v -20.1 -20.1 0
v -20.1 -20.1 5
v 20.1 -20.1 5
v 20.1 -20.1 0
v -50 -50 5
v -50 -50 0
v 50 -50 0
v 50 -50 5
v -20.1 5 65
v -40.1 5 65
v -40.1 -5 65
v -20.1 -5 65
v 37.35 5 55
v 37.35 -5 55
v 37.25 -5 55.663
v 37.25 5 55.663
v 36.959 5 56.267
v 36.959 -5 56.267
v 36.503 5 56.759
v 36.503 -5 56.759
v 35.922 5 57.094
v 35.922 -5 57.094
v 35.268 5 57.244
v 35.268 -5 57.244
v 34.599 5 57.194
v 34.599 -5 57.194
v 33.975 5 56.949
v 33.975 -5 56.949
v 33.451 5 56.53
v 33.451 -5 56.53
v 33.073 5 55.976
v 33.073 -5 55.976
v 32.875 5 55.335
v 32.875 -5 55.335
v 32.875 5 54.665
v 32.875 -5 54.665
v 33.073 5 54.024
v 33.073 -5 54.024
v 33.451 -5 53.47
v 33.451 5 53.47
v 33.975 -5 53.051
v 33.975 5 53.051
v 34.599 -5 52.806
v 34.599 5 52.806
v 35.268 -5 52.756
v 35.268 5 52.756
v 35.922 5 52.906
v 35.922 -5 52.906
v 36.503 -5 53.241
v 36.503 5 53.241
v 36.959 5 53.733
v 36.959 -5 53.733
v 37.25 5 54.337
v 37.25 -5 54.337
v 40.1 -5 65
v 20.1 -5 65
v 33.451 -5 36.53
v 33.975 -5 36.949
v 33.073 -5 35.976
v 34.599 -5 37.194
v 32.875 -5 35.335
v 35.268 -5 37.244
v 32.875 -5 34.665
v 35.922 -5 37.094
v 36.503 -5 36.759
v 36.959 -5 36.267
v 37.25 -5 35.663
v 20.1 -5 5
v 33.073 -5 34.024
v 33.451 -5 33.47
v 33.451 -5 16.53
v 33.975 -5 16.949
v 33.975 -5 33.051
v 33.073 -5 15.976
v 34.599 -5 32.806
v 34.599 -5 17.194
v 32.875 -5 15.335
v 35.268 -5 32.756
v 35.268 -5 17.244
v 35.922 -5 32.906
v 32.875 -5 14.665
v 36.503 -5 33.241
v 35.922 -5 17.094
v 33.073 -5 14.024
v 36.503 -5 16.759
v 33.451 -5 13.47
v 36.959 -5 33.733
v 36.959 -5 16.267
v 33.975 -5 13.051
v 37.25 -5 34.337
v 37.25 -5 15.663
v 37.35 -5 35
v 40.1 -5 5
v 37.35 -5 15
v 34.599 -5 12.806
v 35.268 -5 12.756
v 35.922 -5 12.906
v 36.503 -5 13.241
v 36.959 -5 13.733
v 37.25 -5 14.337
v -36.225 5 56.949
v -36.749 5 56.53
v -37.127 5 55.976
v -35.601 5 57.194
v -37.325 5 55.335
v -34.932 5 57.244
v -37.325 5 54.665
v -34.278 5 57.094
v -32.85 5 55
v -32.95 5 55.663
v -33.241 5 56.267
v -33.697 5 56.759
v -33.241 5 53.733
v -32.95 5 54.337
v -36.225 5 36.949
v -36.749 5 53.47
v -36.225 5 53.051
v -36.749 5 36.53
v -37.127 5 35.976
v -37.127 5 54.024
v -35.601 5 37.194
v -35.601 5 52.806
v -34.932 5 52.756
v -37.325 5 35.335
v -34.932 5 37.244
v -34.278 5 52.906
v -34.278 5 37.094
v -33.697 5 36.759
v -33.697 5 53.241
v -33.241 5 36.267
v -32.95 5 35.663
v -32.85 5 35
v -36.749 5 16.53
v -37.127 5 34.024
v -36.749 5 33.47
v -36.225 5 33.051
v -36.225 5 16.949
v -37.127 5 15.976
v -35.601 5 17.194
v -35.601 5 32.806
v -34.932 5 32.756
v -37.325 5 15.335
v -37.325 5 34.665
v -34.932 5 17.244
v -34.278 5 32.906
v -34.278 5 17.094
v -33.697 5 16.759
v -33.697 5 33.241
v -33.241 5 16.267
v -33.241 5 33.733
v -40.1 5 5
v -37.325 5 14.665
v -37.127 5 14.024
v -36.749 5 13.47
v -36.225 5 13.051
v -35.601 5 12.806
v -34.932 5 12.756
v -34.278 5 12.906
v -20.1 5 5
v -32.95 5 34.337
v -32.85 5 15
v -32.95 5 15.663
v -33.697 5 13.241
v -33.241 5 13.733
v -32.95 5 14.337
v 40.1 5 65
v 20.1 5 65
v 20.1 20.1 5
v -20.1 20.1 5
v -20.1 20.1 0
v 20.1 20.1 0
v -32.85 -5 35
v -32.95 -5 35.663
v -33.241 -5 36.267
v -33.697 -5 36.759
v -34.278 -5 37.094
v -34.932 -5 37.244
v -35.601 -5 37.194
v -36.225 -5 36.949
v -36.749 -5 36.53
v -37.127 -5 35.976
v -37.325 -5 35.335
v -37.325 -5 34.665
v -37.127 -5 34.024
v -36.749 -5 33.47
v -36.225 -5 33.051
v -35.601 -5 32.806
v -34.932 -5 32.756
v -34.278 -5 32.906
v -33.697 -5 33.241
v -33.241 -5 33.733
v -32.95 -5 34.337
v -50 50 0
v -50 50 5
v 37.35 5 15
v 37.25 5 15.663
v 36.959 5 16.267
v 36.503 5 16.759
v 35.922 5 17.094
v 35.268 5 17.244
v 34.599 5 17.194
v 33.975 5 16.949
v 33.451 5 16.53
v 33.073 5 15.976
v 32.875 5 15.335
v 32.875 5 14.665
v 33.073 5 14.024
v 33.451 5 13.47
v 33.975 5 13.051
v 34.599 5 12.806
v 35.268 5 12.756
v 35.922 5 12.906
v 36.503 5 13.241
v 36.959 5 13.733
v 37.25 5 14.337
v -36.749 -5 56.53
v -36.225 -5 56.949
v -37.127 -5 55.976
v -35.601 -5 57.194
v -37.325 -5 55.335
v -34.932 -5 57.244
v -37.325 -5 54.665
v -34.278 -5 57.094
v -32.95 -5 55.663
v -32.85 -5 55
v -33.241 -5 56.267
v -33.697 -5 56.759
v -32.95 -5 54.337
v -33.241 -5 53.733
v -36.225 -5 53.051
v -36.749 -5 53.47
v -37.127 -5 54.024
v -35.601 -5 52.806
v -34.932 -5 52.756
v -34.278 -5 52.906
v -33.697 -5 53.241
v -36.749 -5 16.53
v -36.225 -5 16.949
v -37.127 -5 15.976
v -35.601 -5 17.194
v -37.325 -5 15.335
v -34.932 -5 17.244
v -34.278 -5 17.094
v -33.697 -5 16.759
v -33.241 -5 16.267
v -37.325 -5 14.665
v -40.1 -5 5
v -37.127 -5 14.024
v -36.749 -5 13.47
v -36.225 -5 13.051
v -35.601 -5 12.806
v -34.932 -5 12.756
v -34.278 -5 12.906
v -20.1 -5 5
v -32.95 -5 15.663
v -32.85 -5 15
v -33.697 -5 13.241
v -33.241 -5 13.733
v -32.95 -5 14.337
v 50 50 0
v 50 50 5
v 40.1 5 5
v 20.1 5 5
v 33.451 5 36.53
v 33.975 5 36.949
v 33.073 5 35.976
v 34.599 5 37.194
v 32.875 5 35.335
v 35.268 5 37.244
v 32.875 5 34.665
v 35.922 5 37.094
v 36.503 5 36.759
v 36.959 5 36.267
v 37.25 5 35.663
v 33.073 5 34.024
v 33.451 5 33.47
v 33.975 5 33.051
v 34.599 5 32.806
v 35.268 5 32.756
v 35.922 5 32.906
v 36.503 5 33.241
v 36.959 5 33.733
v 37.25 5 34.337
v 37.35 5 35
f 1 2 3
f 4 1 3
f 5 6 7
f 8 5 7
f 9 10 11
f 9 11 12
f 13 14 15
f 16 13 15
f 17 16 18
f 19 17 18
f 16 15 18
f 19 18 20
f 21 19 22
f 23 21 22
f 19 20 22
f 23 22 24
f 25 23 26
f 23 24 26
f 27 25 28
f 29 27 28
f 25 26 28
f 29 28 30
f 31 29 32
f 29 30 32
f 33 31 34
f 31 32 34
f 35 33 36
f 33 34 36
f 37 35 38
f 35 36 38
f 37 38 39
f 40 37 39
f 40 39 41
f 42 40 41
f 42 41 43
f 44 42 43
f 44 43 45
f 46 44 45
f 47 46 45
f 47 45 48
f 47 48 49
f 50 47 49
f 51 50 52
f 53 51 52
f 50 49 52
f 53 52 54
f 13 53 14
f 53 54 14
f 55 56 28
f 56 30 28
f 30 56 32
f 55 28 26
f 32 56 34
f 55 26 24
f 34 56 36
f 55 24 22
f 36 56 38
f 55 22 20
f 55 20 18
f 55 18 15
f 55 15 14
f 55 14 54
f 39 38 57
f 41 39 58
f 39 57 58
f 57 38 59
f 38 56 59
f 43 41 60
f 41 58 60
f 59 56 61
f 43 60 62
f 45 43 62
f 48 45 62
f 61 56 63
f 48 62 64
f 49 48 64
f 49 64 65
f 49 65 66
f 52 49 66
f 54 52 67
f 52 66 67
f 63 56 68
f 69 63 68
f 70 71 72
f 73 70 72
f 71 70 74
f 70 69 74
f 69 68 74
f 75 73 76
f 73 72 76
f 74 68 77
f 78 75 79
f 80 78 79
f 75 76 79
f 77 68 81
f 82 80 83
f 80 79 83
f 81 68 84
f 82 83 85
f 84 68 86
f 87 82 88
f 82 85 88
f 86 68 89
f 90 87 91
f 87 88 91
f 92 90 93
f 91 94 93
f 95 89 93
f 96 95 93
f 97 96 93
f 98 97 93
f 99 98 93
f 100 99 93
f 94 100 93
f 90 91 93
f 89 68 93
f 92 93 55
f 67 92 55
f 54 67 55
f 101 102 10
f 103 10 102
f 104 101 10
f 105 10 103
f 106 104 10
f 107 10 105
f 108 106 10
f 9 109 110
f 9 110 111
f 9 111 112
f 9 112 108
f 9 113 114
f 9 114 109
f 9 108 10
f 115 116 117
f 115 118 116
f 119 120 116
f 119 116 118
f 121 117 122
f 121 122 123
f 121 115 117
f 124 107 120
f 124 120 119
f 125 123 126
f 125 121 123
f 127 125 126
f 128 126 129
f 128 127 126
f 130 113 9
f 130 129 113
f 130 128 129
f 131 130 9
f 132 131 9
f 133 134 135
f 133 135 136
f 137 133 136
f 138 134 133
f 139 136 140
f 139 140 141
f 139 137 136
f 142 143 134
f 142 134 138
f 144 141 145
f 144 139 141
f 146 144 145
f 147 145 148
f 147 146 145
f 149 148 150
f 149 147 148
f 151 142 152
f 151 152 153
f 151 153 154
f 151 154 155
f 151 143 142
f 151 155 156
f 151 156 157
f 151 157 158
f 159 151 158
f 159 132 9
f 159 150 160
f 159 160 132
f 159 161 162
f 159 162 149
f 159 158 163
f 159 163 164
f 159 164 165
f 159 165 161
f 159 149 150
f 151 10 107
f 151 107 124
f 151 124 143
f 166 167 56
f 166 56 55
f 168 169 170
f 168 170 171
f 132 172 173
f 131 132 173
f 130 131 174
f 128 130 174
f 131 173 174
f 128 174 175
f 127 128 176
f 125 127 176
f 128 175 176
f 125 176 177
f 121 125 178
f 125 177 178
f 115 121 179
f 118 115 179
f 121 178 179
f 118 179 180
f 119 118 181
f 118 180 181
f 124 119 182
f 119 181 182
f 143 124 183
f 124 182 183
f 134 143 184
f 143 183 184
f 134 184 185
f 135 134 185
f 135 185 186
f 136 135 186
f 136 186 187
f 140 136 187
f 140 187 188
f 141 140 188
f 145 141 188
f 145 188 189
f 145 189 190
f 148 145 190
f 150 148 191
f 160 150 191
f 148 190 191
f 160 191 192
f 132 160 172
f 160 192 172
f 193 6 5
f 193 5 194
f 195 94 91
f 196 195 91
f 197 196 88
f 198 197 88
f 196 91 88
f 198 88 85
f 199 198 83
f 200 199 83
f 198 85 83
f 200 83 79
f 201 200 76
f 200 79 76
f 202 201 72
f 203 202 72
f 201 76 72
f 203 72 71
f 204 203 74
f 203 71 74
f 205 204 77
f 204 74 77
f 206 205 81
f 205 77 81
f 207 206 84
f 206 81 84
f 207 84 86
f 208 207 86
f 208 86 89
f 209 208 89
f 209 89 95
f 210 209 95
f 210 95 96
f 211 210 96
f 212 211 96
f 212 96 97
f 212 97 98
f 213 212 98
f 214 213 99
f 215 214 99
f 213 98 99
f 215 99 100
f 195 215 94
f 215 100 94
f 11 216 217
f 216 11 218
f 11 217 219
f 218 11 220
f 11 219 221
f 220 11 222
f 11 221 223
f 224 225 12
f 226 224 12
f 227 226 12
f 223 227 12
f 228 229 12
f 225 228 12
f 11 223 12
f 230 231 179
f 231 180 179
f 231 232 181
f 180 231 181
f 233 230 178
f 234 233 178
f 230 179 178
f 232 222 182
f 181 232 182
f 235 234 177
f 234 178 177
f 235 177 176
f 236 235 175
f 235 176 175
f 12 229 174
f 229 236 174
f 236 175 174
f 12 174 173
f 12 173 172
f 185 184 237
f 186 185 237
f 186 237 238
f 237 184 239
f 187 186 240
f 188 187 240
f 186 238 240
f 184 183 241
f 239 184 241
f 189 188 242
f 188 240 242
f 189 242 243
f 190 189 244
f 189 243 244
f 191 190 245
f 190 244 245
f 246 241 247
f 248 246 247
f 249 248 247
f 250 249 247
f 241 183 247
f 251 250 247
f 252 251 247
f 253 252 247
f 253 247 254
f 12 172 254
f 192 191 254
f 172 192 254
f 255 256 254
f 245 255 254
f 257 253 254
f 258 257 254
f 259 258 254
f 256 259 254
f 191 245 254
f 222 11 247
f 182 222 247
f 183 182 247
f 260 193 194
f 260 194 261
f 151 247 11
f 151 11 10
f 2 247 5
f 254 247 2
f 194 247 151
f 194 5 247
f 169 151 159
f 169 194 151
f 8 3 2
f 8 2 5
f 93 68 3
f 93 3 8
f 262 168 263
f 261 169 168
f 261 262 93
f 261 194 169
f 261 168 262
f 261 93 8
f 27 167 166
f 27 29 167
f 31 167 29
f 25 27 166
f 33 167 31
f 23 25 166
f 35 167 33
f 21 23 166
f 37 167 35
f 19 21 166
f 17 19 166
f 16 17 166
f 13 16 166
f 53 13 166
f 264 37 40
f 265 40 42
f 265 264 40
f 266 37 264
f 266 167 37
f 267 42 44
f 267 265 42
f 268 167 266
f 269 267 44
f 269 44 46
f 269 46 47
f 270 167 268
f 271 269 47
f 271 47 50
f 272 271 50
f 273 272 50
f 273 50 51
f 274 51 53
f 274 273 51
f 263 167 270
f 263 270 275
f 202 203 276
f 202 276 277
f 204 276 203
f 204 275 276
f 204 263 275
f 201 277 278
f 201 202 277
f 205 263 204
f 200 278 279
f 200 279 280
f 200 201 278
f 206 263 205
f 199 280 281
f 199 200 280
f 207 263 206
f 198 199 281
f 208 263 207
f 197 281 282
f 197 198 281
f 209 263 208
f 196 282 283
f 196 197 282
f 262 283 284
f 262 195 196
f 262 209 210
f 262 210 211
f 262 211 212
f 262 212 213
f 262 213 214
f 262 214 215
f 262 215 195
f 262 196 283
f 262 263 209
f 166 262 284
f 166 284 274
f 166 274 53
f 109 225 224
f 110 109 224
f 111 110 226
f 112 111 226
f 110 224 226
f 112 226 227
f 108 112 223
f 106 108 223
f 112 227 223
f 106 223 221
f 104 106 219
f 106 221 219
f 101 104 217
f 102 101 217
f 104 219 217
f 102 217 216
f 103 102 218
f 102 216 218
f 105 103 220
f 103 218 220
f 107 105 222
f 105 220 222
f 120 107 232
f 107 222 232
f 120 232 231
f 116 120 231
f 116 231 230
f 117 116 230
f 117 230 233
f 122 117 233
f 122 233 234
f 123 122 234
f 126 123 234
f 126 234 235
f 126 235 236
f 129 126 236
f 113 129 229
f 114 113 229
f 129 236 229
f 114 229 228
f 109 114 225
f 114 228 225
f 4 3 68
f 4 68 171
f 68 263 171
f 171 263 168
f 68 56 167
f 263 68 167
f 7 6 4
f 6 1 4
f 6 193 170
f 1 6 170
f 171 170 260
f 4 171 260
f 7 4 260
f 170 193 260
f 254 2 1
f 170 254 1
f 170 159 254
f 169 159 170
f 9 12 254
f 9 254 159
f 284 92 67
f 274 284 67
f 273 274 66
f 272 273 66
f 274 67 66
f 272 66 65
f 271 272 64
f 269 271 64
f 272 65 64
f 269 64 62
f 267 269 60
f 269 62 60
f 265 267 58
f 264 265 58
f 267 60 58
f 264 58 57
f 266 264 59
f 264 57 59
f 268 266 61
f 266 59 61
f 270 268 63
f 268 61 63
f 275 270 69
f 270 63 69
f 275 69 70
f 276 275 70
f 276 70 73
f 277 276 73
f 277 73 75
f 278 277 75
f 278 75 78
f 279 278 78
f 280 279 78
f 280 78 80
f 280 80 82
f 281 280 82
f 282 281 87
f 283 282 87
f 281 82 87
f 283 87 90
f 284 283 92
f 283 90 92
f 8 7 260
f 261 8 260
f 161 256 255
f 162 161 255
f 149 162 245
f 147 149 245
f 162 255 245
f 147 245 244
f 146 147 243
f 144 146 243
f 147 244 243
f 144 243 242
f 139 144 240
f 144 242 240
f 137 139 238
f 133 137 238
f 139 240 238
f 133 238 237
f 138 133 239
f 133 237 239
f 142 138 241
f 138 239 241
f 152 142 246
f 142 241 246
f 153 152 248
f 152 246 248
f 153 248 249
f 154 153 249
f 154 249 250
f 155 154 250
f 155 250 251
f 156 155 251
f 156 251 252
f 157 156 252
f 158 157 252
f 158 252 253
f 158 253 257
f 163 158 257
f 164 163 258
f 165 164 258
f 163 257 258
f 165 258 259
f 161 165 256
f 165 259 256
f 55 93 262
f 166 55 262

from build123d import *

# Parameters (mm, degrees)
SKETCH_W        = 100
SKETCH_H        = 100
PAD_DEPTH       = 5
SKETCH001_W     = 40.2
SKETCH001_H     = 40.2
POCKET_DEPTH    = 5
SKETCH002_W     = 20
SKETCH002_H     = 10
PAD001_DEPTH    = 60
SKETCH003_R     = 2.25
POCKET001_DEPTH = 10


with BuildPart() as part:
    # Sketch → Pad (new body)
    with BuildSketch(Plane.XY):
        Rectangle(SKETCH_W, SKETCH_H)
    extrude(amount=PAD_DEPTH)

    # Sketch001 (on DatumPlane) → Pocket (cut)
    with BuildSketch(Plane.XY.offset(5)):
        Rectangle(SKETCH001_W, SKETCH001_H)
    extrude(amount=-POCKET_DEPTH, mode=Mode.SUBTRACT)

    # Sketch002 (on DatumPlane) → Pad001 (join)
    with BuildSketch(Plane.XY.offset(5)):
        with Locations((-30.1, 0)):
            Rectangle(SKETCH002_W, SKETCH002_H)
        with Locations((30.1, 0)):
            Rectangle(SKETCH002_W, SKETCH002_H)
    extrude(amount=PAD001_DEPTH)

    # Sketch003 (on DatumPlane) → Pocket001 (cut)
    with BuildSketch(Plane.XZ.offset(5)):
        with Locations((-35.1, 15)):
            Circle(SKETCH003_R)
        with Locations((35.1, 15)):
            Circle(SKETCH003_R)
        with Locations((-35.1, 35)):
            Circle(SKETCH003_R)
        with Locations((-35.1, 55)):
            Circle(SKETCH003_R)
        with Locations((-35.1, 75)):
            Circle(SKETCH003_R)
        with Locations((35.1, 75)):
            Circle(SKETCH003_R)
        with Locations((35.1, 55)):
            Circle(SKETCH003_R)
        with Locations((35.1, 35)):
            Circle(SKETCH003_R)
    extrude(amount=-POCKET001_DEPTH, mode=Mode.SUBTRACT)


solid = part.part
